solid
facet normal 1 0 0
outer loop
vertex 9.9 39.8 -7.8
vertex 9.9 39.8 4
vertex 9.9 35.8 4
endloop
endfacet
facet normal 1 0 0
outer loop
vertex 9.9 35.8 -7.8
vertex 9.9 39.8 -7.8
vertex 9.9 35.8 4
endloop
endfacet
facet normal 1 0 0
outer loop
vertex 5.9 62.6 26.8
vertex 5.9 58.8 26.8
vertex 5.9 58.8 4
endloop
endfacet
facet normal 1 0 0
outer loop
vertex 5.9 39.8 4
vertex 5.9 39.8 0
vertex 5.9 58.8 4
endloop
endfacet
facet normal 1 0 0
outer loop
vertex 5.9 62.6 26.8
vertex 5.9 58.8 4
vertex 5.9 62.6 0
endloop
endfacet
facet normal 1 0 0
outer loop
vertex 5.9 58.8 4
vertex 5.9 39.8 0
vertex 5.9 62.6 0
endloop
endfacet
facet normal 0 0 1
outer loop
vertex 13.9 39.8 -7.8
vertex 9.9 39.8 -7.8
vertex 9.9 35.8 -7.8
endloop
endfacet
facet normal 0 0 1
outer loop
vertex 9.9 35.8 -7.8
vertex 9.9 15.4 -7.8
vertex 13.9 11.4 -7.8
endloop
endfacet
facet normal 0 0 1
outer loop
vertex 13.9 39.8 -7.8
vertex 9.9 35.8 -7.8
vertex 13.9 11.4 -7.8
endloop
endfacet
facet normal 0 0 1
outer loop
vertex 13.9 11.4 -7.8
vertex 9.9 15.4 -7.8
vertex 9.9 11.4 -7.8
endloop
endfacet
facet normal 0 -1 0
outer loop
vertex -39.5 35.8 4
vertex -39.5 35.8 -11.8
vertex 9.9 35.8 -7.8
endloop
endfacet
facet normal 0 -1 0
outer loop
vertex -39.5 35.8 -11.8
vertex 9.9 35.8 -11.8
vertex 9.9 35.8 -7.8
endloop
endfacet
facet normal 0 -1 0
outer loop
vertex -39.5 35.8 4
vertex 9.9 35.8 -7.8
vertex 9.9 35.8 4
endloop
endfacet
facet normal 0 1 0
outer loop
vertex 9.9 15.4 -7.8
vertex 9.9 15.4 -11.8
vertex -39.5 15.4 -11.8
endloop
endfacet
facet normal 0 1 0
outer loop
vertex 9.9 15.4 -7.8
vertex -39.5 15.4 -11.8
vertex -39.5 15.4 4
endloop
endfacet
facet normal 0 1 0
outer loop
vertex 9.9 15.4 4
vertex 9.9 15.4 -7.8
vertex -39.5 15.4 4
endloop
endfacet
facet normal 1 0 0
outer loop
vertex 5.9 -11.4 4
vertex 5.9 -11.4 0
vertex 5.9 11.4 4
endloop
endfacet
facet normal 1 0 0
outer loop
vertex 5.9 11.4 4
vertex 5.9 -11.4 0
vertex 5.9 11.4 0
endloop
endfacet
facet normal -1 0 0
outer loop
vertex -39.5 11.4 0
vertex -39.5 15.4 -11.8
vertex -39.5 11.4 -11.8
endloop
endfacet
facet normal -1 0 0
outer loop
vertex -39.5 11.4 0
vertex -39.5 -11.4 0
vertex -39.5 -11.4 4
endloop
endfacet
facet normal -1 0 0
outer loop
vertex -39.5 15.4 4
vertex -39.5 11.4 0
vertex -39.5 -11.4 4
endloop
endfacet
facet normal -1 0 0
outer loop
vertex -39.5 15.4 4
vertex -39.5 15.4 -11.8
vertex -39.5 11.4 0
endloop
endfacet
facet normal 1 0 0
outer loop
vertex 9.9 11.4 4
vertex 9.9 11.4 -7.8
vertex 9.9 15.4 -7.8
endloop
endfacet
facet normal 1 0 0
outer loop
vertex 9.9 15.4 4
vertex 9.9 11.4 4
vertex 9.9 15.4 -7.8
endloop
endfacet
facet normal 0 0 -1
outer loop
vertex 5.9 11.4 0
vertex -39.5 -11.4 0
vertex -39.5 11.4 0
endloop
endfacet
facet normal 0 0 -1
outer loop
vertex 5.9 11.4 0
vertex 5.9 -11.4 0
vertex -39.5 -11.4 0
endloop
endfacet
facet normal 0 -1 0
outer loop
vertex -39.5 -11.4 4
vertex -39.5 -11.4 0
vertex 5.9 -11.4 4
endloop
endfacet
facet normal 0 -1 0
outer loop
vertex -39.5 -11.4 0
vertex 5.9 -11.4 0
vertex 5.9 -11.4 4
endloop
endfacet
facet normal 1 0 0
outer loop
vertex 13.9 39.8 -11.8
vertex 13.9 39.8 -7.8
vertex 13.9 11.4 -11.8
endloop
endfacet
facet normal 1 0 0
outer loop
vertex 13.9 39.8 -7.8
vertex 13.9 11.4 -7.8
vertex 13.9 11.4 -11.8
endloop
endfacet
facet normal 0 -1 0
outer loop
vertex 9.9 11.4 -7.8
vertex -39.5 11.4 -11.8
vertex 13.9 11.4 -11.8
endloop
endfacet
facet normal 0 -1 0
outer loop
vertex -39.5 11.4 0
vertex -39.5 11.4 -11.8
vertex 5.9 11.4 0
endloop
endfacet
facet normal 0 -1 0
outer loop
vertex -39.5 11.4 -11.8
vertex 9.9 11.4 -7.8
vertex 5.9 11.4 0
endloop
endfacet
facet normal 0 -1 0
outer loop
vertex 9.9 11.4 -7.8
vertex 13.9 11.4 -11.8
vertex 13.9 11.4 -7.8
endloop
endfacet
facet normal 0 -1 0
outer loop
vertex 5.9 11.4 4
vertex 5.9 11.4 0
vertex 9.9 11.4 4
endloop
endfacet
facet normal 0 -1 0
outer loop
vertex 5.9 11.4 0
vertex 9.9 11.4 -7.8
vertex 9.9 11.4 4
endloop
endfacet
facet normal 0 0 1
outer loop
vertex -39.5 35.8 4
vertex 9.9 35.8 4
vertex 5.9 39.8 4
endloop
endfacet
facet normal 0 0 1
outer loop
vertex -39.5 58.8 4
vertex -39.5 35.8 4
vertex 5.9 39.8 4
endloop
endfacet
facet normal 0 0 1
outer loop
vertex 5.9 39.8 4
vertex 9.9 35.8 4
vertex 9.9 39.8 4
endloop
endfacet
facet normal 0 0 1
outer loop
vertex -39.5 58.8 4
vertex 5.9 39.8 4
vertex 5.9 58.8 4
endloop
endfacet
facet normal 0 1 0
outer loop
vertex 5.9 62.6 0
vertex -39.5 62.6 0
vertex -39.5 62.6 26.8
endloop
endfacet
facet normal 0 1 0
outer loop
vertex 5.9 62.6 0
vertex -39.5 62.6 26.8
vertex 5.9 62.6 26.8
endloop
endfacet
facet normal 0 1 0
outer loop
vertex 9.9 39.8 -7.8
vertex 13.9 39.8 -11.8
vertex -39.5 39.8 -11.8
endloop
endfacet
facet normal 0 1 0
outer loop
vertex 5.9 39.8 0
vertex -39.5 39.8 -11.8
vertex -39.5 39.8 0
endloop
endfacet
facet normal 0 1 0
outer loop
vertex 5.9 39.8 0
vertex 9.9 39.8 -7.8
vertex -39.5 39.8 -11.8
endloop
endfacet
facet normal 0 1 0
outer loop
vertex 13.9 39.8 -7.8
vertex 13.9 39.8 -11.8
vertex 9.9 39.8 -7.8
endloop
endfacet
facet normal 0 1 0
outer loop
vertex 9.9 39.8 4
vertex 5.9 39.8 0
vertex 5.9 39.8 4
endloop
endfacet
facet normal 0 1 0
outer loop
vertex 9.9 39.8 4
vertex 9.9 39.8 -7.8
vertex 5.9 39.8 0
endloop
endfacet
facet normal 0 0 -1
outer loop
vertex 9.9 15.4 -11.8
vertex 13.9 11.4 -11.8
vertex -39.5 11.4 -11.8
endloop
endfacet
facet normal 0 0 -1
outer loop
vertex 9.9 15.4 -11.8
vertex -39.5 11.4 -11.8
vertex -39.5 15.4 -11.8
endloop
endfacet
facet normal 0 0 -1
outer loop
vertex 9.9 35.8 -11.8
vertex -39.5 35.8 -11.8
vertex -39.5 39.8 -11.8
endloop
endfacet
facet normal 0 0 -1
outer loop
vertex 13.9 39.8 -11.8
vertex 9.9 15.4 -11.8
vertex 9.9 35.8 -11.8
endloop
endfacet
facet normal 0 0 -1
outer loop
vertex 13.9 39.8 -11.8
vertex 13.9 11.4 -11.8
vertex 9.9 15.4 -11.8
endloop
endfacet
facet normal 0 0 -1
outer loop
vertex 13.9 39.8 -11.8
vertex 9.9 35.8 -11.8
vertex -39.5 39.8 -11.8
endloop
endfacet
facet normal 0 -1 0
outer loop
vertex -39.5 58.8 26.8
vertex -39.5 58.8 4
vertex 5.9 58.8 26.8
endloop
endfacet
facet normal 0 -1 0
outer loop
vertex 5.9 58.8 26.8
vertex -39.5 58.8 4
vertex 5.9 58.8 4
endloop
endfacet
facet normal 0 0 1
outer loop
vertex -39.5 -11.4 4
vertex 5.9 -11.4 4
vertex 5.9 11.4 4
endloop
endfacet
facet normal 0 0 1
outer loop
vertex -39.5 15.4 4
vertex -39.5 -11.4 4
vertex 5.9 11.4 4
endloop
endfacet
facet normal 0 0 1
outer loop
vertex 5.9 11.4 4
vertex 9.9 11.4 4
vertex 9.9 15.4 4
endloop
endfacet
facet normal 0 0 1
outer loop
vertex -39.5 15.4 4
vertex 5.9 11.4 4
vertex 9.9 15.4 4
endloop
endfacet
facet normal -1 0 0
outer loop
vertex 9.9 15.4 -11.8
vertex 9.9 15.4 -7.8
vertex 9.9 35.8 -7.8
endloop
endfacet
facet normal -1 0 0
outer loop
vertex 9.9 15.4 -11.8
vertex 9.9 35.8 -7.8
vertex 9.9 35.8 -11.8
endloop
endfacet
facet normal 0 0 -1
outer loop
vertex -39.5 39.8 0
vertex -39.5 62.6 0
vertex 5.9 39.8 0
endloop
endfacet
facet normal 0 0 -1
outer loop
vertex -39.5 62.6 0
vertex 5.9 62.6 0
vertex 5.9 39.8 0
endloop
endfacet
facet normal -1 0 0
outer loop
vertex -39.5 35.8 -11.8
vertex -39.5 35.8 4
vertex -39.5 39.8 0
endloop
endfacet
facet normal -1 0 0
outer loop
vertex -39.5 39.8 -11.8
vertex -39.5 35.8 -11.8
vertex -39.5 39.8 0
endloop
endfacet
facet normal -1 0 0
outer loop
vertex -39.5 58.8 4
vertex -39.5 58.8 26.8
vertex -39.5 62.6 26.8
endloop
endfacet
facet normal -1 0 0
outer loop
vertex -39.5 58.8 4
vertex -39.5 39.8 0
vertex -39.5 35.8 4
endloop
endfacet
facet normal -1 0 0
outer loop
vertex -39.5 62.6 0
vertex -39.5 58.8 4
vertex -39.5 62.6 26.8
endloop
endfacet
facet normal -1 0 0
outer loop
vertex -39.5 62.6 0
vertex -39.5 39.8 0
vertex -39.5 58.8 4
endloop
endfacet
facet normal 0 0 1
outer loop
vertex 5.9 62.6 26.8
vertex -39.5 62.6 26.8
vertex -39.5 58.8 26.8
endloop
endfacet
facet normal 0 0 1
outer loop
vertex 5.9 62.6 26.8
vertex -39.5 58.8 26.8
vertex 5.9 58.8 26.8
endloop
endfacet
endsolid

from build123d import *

# Parameters (mm, degrees)
SKETCH_1_W       = 11.8
SKETCH_1_H       = 22.8
EXTRUDE_1_DEPTH  = 4
SKETCH_2_W       = 15.8
SKETCH_2_H       = 4
EXTRUDE_2_DEPTH  = 2
SKETCH_5_W       = 15.8
SKETCH_5_H       = 4
EXTRUDE_4_DEPTH  = 2
SKETCH_6_W       = 15.8
SKETCH_6_H       = 4
EXTRUDE_5_DEPTH  = 11.8
SKETCH_7_W       = 4
SKETCH_7_H       = 14.2
EXTRUDE_7_DEPTH  = 4
SKETCH_8_W       = 4
SKETCH_8_H       = 22.8
EXTRUDE_8_DEPTH  = 33.6
SKETCH_10_W      = 15.8
SKETCH_10_H      = 4
EXTRUDE_9_DEPTH  = 33.6
SKETCH_11_W      = 15.8
SKETCH_11_H      = 4
EXTRUDE_10_DEPTH = 33.6
SKETCH_12_W      = 45.4
SKETCH_12_H      = 3.8
EXTRUDE_11_DEPTH = 22.8


with BuildPart() as part:
    # 스케치1 → 보스-돌출1 (new body)
    with BuildSketch(Plane.XY):
        Rectangle(SKETCH_1_W, SKETCH_1_H)
    extrude(amount=EXTRUDE_1_DEPTH)

    # 스케치2 → 보스-돌출2 (add)
    with BuildSketch(Plane(origin=(0, 11.4, 0), x_dir=(1, 0, 0), z_dir=(0, 1, 0))):
        with Locations((2, -2)):
            Rectangle(SKETCH_2_W, SKETCH_2_H)
    extrude(amount=EXTRUDE_2_DEPTH)

    # 스케치5 → 보스-돌출4 (add)
    with BuildSketch(Plane(origin=(0, 13.4, 0), x_dir=(1, 0, 0), z_dir=(0, 1, 0))):
        with Locations((2, -2)):
            Rectangle(SKETCH_5_W, SKETCH_5_H)
    extrude(amount=EXTRUDE_4_DEPTH)

    # 스케치6 → 보스-돌출5 (add)
    with BuildSketch(Plane(origin=(0, 0, 0), x_dir=(-1, 0, 0), z_dir=(0, 0, -1))):
        with Locations((-2, 13.4)):
            Rectangle(SKETCH_6_W, SKETCH_6_H)
    extrude(amount=EXTRUDE_5_DEPTH)

    # 스케치7 → 보스-돌출7 (add)
    with BuildSketch(Plane(origin=(9.9, 0, 0), x_dir=(0, 0, -1), z_dir=(1, 0, 0))):
        with Locations((9.8, 18.5)):
            Rectangle(SKETCH_7_W, SKETCH_7_H)
    extrude(amount=EXTRUDE_7_DEPTH)

    # 스케치8 → 보스-돌출8 (add)
    with BuildSketch(Plane.ZY.offset(5.9)):
        with Locations((2, 0)):
            Rectangle(SKETCH_8_W, SKETCH_8_H)
    extrude(amount=EXTRUDE_8_DEPTH)

    # 대칭 복사3: part across plane


with BuildPart() as part_1:
    add(part.part)
    add(part.part.mirror(Plane(origin=(13.9, 25.6, -11.8), x_dir=(0, 0, 1), z_dir=(0, -1, 0))))

    # 스케치10 → 보스-돌출9 (add)
    with BuildSketch(Plane.ZY.offset(5.9)):
        with Locations((-3.9, 13.4)):
            Rectangle(SKETCH_10_W, SKETCH_10_H)
    extrude(amount=EXTRUDE_9_DEPTH)

    # 스케치11 → 보스-돌출10 (add)
    with BuildSketch(Plane.ZY.offset(5.9)):
        with Locations((-3.9, 37.8)):
            Rectangle(SKETCH_11_W, SKETCH_11_H)
    extrude(amount=EXTRUDE_10_DEPTH)

    # 스케치12 → 보스-돌출11 (add)
    with BuildSketch(Plane.XY.offset(4)):
        with Locations((-16.8, 60.7)):
            Rectangle(SKETCH_12_W, SKETCH_12_H)
    extrude(amount=EXTRUDE_11_DEPTH)


solid = part_1.part
